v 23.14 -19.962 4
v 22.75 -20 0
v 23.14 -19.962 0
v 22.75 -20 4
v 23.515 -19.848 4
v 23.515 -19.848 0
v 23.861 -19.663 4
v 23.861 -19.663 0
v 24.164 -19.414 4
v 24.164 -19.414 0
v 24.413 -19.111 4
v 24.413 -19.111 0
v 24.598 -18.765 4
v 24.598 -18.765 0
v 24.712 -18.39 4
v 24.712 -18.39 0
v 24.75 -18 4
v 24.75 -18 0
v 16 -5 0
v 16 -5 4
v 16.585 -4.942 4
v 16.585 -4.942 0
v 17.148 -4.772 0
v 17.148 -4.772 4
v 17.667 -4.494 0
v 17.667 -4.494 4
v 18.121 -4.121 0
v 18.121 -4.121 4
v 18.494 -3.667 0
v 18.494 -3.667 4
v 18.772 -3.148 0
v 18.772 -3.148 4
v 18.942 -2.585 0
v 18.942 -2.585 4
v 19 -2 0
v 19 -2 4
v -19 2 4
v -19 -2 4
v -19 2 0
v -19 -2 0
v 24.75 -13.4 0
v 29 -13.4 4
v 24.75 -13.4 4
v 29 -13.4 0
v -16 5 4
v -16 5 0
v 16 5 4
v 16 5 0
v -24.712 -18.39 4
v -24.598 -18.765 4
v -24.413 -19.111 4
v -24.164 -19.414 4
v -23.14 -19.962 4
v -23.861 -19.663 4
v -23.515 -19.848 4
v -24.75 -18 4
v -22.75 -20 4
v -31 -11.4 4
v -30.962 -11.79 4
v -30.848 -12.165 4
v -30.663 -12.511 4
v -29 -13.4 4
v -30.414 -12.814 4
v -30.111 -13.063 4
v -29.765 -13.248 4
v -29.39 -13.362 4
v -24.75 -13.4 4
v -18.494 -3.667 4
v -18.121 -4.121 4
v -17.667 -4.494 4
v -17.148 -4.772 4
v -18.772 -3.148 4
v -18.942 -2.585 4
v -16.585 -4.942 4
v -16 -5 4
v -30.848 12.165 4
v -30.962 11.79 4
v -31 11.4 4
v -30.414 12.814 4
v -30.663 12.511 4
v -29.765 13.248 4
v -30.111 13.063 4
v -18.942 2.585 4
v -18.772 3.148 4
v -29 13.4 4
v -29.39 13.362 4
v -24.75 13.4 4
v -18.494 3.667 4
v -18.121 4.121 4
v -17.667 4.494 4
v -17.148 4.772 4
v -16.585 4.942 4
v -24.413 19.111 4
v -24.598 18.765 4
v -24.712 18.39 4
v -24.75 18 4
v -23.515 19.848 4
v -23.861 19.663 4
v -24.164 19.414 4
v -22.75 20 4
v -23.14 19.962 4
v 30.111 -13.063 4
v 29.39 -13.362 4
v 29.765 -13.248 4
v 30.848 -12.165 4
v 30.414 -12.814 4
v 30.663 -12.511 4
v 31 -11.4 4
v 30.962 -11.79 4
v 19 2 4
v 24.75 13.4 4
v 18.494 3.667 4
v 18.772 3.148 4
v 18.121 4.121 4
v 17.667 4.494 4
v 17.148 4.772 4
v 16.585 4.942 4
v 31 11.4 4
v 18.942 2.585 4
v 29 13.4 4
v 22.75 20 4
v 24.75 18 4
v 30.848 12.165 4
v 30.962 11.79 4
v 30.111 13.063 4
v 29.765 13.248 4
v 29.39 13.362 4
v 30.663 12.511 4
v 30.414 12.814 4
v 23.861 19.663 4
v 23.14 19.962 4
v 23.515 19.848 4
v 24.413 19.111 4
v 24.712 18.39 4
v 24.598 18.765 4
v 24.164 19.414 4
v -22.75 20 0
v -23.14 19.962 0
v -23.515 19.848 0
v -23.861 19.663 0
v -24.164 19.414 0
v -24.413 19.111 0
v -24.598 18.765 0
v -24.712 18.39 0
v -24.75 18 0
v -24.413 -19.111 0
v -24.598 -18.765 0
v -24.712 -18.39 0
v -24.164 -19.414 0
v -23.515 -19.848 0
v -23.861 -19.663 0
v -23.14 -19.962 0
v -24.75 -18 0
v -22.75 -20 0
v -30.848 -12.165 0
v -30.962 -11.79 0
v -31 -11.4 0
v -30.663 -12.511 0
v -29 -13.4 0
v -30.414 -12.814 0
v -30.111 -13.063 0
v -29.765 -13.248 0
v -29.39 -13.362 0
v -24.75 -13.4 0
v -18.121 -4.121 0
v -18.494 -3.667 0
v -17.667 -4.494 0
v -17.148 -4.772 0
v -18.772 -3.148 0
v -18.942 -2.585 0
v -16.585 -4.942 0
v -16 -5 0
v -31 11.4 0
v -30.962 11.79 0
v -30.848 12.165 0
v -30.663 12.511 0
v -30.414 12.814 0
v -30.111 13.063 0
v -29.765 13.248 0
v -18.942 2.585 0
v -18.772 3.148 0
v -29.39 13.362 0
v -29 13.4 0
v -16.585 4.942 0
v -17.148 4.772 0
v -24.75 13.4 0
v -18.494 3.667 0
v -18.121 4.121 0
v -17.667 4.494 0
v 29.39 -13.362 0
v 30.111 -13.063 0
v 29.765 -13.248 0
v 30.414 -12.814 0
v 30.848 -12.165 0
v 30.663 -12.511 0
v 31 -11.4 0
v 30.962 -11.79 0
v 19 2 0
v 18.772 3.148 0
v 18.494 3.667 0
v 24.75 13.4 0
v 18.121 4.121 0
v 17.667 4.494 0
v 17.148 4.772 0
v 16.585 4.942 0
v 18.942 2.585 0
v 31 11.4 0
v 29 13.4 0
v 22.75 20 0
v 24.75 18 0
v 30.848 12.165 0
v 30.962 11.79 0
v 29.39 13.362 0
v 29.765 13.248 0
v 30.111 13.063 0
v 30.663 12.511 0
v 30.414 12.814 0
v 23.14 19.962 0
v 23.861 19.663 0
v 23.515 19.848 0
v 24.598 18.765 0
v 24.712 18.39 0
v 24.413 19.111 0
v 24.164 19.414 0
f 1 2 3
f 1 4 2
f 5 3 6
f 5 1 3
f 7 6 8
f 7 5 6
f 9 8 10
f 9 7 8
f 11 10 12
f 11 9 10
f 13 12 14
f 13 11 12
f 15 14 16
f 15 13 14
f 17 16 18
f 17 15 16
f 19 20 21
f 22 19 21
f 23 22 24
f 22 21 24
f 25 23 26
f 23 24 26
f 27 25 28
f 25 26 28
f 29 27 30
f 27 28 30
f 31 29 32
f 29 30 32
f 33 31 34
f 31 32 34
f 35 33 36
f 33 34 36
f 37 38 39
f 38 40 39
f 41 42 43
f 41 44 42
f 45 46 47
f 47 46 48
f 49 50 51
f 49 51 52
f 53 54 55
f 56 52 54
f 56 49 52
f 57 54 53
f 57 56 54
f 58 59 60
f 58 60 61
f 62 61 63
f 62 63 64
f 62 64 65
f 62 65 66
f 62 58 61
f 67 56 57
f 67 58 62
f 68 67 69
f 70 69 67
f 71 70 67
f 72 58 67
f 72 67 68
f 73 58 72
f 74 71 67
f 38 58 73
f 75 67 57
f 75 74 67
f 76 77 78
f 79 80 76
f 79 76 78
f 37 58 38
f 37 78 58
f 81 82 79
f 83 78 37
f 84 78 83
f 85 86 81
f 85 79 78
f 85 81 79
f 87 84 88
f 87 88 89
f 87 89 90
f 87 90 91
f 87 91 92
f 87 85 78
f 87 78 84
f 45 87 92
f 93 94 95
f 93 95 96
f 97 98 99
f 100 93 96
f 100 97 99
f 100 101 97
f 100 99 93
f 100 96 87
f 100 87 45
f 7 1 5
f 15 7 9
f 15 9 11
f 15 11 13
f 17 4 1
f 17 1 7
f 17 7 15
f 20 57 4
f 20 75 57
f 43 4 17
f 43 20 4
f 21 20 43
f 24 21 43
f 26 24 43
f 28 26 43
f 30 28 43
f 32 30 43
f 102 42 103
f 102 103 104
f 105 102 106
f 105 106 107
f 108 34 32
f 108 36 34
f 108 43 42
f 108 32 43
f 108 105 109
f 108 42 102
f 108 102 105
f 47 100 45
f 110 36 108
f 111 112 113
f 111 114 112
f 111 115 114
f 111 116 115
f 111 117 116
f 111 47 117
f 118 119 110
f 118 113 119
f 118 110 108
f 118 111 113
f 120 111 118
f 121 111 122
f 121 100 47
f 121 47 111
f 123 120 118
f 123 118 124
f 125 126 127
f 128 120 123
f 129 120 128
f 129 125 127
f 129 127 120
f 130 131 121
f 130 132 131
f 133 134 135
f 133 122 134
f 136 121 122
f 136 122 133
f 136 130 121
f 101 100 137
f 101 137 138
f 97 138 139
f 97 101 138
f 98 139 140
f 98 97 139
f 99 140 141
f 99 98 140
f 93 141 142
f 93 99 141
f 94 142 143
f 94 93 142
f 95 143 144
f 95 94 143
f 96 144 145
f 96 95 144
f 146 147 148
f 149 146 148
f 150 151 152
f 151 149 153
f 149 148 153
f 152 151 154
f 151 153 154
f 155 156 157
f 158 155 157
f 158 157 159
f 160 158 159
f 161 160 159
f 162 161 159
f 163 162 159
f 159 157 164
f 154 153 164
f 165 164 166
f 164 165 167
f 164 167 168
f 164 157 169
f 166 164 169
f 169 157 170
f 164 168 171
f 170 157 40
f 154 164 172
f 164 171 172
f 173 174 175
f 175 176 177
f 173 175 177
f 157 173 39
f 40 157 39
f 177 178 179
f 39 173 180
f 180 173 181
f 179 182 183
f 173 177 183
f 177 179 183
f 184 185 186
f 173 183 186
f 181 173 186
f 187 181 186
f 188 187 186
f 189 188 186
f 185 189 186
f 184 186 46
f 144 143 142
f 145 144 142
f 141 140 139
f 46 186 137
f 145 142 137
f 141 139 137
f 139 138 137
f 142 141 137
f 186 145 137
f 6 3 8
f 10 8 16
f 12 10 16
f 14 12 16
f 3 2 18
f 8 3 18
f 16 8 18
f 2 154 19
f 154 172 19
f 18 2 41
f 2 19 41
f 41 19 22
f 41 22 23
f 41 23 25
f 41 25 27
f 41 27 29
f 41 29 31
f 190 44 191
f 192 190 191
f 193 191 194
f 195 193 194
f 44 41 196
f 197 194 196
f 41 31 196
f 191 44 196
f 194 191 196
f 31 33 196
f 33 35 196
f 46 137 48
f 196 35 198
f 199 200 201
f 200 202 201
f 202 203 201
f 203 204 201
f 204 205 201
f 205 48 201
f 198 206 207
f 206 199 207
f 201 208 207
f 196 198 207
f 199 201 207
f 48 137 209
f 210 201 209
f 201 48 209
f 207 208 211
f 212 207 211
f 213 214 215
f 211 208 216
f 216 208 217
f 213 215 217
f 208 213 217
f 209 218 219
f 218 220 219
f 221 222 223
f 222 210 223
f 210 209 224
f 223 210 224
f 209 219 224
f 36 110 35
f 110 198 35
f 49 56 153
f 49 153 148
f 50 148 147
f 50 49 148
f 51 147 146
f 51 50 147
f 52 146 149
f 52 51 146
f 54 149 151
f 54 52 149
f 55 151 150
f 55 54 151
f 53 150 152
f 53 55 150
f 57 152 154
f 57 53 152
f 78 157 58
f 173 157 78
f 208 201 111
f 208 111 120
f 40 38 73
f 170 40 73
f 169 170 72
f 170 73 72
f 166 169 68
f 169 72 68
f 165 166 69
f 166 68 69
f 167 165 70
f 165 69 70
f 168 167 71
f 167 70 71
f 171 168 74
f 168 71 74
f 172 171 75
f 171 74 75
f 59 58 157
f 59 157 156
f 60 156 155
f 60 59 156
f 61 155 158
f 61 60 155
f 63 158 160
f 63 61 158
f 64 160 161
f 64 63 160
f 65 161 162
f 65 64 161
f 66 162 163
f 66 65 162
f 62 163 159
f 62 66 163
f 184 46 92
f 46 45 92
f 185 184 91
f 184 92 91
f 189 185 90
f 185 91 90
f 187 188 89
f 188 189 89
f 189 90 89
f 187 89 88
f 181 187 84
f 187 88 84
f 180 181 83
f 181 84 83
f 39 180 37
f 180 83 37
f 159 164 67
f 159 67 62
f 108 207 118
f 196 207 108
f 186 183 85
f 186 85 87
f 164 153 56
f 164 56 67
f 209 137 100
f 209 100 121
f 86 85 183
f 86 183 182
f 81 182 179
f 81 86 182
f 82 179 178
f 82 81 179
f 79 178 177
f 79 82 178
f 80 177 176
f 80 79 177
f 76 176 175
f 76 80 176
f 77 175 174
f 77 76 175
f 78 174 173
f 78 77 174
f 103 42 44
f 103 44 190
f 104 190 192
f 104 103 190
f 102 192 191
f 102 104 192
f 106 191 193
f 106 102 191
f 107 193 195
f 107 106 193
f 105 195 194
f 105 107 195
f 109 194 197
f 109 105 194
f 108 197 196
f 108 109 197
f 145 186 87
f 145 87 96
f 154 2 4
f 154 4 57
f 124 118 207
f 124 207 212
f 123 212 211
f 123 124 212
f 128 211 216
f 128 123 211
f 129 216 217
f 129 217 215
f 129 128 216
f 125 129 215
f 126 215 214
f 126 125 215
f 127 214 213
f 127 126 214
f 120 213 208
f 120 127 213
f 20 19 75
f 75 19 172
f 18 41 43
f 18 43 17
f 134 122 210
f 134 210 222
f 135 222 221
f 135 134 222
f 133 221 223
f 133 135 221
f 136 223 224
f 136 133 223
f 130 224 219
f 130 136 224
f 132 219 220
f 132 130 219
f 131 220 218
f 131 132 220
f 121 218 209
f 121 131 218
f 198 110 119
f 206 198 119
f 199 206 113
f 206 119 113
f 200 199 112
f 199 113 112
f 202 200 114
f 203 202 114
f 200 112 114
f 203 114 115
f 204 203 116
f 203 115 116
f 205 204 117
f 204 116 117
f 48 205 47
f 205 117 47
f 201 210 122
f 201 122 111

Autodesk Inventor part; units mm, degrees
ref_plane "YZ Plane" through (0, 0, 0) normal (1, 0, 0) x (0, 1, 0)
ref_plane "XZ Plane" through (0, 0, 0) normal (0, 1, 0) x (-1, 0, 0)
ref_plane "XY Plane" through (0, 0, 0) normal (0, 0, 1) x (1, 0, 0)
sketch "スケッチ1" plane through (0, 0, 0) normal (0, 0, 1) x (1, 0, 0)
  line L0 (-24.75, 20) -> (24.75, 20)
  line L1 (24.75, 20) -> (24.75, -20)
  line L2 (24.75, -20) -> (-24.75, -20)
  line L3 (-24.75, -20) -> (-24.75, 20)
  line L4 (-24.75, 20) -> (24.75, -20) construction
  line L5 (24.75, 20) -> (-24.75, -20) construction
  line L6 (-31, 13.4) -> (31, 13.4)
  line L7 (31, 13.4) -> (31, -13.4)
  line L8 (31, -13.4) -> (-31, -13.4)
  line L9 (-31, -13.4) -> (-31, 13.4)
  line L10 (-31, 13.4) -> (31, -13.4) construction
  line L11 (31, 13.4) -> (-31, -13.4) construction
  line L12 (-19, 5) -> (19, 5)
  line L13 (19, 5) -> (19, -5)
  line L14 (19, -5) -> (-19, -5)
  line L15 (-19, -5) -> (-19, 5)
  line L16 (-19, 5) -> (19, -5) construction
  line L17 (19, 5) -> (-19, -5) construction
  point P0 (0, 0)
  point P1 (-24.75, 13.4)
  point P2 (-24.75, -13.4)
  point P3 (24.75, -13.4)
  point P4 (24.75, 13.4)
  dimension "d0" = 49.5
  dimension "d1" = 40
  dimension "d2" = 62
  dimension "d3" = 26.8
  dimension "d4" = 38
  dimension "d5" = 10
extrude "押し出し1" add sketch "スケッチ1" along normal blind 4
fillet "フィレット1" radius 3 4 edges at (-19, 5, 2) (19, 5, 2) (-19, -5, 2) (19, -5, 2)
fillet "フィレット2" radius 2 8 edges at (24.75, 20, 2) (31, 13.4, 2) (31, -13.4, 2) (24.75, -20, 2) (-24.75, 20, 2) (-31, 13.4, 2) (-31, -13.4, 2) (-24.75, -20, 2)
properties part number "top"
